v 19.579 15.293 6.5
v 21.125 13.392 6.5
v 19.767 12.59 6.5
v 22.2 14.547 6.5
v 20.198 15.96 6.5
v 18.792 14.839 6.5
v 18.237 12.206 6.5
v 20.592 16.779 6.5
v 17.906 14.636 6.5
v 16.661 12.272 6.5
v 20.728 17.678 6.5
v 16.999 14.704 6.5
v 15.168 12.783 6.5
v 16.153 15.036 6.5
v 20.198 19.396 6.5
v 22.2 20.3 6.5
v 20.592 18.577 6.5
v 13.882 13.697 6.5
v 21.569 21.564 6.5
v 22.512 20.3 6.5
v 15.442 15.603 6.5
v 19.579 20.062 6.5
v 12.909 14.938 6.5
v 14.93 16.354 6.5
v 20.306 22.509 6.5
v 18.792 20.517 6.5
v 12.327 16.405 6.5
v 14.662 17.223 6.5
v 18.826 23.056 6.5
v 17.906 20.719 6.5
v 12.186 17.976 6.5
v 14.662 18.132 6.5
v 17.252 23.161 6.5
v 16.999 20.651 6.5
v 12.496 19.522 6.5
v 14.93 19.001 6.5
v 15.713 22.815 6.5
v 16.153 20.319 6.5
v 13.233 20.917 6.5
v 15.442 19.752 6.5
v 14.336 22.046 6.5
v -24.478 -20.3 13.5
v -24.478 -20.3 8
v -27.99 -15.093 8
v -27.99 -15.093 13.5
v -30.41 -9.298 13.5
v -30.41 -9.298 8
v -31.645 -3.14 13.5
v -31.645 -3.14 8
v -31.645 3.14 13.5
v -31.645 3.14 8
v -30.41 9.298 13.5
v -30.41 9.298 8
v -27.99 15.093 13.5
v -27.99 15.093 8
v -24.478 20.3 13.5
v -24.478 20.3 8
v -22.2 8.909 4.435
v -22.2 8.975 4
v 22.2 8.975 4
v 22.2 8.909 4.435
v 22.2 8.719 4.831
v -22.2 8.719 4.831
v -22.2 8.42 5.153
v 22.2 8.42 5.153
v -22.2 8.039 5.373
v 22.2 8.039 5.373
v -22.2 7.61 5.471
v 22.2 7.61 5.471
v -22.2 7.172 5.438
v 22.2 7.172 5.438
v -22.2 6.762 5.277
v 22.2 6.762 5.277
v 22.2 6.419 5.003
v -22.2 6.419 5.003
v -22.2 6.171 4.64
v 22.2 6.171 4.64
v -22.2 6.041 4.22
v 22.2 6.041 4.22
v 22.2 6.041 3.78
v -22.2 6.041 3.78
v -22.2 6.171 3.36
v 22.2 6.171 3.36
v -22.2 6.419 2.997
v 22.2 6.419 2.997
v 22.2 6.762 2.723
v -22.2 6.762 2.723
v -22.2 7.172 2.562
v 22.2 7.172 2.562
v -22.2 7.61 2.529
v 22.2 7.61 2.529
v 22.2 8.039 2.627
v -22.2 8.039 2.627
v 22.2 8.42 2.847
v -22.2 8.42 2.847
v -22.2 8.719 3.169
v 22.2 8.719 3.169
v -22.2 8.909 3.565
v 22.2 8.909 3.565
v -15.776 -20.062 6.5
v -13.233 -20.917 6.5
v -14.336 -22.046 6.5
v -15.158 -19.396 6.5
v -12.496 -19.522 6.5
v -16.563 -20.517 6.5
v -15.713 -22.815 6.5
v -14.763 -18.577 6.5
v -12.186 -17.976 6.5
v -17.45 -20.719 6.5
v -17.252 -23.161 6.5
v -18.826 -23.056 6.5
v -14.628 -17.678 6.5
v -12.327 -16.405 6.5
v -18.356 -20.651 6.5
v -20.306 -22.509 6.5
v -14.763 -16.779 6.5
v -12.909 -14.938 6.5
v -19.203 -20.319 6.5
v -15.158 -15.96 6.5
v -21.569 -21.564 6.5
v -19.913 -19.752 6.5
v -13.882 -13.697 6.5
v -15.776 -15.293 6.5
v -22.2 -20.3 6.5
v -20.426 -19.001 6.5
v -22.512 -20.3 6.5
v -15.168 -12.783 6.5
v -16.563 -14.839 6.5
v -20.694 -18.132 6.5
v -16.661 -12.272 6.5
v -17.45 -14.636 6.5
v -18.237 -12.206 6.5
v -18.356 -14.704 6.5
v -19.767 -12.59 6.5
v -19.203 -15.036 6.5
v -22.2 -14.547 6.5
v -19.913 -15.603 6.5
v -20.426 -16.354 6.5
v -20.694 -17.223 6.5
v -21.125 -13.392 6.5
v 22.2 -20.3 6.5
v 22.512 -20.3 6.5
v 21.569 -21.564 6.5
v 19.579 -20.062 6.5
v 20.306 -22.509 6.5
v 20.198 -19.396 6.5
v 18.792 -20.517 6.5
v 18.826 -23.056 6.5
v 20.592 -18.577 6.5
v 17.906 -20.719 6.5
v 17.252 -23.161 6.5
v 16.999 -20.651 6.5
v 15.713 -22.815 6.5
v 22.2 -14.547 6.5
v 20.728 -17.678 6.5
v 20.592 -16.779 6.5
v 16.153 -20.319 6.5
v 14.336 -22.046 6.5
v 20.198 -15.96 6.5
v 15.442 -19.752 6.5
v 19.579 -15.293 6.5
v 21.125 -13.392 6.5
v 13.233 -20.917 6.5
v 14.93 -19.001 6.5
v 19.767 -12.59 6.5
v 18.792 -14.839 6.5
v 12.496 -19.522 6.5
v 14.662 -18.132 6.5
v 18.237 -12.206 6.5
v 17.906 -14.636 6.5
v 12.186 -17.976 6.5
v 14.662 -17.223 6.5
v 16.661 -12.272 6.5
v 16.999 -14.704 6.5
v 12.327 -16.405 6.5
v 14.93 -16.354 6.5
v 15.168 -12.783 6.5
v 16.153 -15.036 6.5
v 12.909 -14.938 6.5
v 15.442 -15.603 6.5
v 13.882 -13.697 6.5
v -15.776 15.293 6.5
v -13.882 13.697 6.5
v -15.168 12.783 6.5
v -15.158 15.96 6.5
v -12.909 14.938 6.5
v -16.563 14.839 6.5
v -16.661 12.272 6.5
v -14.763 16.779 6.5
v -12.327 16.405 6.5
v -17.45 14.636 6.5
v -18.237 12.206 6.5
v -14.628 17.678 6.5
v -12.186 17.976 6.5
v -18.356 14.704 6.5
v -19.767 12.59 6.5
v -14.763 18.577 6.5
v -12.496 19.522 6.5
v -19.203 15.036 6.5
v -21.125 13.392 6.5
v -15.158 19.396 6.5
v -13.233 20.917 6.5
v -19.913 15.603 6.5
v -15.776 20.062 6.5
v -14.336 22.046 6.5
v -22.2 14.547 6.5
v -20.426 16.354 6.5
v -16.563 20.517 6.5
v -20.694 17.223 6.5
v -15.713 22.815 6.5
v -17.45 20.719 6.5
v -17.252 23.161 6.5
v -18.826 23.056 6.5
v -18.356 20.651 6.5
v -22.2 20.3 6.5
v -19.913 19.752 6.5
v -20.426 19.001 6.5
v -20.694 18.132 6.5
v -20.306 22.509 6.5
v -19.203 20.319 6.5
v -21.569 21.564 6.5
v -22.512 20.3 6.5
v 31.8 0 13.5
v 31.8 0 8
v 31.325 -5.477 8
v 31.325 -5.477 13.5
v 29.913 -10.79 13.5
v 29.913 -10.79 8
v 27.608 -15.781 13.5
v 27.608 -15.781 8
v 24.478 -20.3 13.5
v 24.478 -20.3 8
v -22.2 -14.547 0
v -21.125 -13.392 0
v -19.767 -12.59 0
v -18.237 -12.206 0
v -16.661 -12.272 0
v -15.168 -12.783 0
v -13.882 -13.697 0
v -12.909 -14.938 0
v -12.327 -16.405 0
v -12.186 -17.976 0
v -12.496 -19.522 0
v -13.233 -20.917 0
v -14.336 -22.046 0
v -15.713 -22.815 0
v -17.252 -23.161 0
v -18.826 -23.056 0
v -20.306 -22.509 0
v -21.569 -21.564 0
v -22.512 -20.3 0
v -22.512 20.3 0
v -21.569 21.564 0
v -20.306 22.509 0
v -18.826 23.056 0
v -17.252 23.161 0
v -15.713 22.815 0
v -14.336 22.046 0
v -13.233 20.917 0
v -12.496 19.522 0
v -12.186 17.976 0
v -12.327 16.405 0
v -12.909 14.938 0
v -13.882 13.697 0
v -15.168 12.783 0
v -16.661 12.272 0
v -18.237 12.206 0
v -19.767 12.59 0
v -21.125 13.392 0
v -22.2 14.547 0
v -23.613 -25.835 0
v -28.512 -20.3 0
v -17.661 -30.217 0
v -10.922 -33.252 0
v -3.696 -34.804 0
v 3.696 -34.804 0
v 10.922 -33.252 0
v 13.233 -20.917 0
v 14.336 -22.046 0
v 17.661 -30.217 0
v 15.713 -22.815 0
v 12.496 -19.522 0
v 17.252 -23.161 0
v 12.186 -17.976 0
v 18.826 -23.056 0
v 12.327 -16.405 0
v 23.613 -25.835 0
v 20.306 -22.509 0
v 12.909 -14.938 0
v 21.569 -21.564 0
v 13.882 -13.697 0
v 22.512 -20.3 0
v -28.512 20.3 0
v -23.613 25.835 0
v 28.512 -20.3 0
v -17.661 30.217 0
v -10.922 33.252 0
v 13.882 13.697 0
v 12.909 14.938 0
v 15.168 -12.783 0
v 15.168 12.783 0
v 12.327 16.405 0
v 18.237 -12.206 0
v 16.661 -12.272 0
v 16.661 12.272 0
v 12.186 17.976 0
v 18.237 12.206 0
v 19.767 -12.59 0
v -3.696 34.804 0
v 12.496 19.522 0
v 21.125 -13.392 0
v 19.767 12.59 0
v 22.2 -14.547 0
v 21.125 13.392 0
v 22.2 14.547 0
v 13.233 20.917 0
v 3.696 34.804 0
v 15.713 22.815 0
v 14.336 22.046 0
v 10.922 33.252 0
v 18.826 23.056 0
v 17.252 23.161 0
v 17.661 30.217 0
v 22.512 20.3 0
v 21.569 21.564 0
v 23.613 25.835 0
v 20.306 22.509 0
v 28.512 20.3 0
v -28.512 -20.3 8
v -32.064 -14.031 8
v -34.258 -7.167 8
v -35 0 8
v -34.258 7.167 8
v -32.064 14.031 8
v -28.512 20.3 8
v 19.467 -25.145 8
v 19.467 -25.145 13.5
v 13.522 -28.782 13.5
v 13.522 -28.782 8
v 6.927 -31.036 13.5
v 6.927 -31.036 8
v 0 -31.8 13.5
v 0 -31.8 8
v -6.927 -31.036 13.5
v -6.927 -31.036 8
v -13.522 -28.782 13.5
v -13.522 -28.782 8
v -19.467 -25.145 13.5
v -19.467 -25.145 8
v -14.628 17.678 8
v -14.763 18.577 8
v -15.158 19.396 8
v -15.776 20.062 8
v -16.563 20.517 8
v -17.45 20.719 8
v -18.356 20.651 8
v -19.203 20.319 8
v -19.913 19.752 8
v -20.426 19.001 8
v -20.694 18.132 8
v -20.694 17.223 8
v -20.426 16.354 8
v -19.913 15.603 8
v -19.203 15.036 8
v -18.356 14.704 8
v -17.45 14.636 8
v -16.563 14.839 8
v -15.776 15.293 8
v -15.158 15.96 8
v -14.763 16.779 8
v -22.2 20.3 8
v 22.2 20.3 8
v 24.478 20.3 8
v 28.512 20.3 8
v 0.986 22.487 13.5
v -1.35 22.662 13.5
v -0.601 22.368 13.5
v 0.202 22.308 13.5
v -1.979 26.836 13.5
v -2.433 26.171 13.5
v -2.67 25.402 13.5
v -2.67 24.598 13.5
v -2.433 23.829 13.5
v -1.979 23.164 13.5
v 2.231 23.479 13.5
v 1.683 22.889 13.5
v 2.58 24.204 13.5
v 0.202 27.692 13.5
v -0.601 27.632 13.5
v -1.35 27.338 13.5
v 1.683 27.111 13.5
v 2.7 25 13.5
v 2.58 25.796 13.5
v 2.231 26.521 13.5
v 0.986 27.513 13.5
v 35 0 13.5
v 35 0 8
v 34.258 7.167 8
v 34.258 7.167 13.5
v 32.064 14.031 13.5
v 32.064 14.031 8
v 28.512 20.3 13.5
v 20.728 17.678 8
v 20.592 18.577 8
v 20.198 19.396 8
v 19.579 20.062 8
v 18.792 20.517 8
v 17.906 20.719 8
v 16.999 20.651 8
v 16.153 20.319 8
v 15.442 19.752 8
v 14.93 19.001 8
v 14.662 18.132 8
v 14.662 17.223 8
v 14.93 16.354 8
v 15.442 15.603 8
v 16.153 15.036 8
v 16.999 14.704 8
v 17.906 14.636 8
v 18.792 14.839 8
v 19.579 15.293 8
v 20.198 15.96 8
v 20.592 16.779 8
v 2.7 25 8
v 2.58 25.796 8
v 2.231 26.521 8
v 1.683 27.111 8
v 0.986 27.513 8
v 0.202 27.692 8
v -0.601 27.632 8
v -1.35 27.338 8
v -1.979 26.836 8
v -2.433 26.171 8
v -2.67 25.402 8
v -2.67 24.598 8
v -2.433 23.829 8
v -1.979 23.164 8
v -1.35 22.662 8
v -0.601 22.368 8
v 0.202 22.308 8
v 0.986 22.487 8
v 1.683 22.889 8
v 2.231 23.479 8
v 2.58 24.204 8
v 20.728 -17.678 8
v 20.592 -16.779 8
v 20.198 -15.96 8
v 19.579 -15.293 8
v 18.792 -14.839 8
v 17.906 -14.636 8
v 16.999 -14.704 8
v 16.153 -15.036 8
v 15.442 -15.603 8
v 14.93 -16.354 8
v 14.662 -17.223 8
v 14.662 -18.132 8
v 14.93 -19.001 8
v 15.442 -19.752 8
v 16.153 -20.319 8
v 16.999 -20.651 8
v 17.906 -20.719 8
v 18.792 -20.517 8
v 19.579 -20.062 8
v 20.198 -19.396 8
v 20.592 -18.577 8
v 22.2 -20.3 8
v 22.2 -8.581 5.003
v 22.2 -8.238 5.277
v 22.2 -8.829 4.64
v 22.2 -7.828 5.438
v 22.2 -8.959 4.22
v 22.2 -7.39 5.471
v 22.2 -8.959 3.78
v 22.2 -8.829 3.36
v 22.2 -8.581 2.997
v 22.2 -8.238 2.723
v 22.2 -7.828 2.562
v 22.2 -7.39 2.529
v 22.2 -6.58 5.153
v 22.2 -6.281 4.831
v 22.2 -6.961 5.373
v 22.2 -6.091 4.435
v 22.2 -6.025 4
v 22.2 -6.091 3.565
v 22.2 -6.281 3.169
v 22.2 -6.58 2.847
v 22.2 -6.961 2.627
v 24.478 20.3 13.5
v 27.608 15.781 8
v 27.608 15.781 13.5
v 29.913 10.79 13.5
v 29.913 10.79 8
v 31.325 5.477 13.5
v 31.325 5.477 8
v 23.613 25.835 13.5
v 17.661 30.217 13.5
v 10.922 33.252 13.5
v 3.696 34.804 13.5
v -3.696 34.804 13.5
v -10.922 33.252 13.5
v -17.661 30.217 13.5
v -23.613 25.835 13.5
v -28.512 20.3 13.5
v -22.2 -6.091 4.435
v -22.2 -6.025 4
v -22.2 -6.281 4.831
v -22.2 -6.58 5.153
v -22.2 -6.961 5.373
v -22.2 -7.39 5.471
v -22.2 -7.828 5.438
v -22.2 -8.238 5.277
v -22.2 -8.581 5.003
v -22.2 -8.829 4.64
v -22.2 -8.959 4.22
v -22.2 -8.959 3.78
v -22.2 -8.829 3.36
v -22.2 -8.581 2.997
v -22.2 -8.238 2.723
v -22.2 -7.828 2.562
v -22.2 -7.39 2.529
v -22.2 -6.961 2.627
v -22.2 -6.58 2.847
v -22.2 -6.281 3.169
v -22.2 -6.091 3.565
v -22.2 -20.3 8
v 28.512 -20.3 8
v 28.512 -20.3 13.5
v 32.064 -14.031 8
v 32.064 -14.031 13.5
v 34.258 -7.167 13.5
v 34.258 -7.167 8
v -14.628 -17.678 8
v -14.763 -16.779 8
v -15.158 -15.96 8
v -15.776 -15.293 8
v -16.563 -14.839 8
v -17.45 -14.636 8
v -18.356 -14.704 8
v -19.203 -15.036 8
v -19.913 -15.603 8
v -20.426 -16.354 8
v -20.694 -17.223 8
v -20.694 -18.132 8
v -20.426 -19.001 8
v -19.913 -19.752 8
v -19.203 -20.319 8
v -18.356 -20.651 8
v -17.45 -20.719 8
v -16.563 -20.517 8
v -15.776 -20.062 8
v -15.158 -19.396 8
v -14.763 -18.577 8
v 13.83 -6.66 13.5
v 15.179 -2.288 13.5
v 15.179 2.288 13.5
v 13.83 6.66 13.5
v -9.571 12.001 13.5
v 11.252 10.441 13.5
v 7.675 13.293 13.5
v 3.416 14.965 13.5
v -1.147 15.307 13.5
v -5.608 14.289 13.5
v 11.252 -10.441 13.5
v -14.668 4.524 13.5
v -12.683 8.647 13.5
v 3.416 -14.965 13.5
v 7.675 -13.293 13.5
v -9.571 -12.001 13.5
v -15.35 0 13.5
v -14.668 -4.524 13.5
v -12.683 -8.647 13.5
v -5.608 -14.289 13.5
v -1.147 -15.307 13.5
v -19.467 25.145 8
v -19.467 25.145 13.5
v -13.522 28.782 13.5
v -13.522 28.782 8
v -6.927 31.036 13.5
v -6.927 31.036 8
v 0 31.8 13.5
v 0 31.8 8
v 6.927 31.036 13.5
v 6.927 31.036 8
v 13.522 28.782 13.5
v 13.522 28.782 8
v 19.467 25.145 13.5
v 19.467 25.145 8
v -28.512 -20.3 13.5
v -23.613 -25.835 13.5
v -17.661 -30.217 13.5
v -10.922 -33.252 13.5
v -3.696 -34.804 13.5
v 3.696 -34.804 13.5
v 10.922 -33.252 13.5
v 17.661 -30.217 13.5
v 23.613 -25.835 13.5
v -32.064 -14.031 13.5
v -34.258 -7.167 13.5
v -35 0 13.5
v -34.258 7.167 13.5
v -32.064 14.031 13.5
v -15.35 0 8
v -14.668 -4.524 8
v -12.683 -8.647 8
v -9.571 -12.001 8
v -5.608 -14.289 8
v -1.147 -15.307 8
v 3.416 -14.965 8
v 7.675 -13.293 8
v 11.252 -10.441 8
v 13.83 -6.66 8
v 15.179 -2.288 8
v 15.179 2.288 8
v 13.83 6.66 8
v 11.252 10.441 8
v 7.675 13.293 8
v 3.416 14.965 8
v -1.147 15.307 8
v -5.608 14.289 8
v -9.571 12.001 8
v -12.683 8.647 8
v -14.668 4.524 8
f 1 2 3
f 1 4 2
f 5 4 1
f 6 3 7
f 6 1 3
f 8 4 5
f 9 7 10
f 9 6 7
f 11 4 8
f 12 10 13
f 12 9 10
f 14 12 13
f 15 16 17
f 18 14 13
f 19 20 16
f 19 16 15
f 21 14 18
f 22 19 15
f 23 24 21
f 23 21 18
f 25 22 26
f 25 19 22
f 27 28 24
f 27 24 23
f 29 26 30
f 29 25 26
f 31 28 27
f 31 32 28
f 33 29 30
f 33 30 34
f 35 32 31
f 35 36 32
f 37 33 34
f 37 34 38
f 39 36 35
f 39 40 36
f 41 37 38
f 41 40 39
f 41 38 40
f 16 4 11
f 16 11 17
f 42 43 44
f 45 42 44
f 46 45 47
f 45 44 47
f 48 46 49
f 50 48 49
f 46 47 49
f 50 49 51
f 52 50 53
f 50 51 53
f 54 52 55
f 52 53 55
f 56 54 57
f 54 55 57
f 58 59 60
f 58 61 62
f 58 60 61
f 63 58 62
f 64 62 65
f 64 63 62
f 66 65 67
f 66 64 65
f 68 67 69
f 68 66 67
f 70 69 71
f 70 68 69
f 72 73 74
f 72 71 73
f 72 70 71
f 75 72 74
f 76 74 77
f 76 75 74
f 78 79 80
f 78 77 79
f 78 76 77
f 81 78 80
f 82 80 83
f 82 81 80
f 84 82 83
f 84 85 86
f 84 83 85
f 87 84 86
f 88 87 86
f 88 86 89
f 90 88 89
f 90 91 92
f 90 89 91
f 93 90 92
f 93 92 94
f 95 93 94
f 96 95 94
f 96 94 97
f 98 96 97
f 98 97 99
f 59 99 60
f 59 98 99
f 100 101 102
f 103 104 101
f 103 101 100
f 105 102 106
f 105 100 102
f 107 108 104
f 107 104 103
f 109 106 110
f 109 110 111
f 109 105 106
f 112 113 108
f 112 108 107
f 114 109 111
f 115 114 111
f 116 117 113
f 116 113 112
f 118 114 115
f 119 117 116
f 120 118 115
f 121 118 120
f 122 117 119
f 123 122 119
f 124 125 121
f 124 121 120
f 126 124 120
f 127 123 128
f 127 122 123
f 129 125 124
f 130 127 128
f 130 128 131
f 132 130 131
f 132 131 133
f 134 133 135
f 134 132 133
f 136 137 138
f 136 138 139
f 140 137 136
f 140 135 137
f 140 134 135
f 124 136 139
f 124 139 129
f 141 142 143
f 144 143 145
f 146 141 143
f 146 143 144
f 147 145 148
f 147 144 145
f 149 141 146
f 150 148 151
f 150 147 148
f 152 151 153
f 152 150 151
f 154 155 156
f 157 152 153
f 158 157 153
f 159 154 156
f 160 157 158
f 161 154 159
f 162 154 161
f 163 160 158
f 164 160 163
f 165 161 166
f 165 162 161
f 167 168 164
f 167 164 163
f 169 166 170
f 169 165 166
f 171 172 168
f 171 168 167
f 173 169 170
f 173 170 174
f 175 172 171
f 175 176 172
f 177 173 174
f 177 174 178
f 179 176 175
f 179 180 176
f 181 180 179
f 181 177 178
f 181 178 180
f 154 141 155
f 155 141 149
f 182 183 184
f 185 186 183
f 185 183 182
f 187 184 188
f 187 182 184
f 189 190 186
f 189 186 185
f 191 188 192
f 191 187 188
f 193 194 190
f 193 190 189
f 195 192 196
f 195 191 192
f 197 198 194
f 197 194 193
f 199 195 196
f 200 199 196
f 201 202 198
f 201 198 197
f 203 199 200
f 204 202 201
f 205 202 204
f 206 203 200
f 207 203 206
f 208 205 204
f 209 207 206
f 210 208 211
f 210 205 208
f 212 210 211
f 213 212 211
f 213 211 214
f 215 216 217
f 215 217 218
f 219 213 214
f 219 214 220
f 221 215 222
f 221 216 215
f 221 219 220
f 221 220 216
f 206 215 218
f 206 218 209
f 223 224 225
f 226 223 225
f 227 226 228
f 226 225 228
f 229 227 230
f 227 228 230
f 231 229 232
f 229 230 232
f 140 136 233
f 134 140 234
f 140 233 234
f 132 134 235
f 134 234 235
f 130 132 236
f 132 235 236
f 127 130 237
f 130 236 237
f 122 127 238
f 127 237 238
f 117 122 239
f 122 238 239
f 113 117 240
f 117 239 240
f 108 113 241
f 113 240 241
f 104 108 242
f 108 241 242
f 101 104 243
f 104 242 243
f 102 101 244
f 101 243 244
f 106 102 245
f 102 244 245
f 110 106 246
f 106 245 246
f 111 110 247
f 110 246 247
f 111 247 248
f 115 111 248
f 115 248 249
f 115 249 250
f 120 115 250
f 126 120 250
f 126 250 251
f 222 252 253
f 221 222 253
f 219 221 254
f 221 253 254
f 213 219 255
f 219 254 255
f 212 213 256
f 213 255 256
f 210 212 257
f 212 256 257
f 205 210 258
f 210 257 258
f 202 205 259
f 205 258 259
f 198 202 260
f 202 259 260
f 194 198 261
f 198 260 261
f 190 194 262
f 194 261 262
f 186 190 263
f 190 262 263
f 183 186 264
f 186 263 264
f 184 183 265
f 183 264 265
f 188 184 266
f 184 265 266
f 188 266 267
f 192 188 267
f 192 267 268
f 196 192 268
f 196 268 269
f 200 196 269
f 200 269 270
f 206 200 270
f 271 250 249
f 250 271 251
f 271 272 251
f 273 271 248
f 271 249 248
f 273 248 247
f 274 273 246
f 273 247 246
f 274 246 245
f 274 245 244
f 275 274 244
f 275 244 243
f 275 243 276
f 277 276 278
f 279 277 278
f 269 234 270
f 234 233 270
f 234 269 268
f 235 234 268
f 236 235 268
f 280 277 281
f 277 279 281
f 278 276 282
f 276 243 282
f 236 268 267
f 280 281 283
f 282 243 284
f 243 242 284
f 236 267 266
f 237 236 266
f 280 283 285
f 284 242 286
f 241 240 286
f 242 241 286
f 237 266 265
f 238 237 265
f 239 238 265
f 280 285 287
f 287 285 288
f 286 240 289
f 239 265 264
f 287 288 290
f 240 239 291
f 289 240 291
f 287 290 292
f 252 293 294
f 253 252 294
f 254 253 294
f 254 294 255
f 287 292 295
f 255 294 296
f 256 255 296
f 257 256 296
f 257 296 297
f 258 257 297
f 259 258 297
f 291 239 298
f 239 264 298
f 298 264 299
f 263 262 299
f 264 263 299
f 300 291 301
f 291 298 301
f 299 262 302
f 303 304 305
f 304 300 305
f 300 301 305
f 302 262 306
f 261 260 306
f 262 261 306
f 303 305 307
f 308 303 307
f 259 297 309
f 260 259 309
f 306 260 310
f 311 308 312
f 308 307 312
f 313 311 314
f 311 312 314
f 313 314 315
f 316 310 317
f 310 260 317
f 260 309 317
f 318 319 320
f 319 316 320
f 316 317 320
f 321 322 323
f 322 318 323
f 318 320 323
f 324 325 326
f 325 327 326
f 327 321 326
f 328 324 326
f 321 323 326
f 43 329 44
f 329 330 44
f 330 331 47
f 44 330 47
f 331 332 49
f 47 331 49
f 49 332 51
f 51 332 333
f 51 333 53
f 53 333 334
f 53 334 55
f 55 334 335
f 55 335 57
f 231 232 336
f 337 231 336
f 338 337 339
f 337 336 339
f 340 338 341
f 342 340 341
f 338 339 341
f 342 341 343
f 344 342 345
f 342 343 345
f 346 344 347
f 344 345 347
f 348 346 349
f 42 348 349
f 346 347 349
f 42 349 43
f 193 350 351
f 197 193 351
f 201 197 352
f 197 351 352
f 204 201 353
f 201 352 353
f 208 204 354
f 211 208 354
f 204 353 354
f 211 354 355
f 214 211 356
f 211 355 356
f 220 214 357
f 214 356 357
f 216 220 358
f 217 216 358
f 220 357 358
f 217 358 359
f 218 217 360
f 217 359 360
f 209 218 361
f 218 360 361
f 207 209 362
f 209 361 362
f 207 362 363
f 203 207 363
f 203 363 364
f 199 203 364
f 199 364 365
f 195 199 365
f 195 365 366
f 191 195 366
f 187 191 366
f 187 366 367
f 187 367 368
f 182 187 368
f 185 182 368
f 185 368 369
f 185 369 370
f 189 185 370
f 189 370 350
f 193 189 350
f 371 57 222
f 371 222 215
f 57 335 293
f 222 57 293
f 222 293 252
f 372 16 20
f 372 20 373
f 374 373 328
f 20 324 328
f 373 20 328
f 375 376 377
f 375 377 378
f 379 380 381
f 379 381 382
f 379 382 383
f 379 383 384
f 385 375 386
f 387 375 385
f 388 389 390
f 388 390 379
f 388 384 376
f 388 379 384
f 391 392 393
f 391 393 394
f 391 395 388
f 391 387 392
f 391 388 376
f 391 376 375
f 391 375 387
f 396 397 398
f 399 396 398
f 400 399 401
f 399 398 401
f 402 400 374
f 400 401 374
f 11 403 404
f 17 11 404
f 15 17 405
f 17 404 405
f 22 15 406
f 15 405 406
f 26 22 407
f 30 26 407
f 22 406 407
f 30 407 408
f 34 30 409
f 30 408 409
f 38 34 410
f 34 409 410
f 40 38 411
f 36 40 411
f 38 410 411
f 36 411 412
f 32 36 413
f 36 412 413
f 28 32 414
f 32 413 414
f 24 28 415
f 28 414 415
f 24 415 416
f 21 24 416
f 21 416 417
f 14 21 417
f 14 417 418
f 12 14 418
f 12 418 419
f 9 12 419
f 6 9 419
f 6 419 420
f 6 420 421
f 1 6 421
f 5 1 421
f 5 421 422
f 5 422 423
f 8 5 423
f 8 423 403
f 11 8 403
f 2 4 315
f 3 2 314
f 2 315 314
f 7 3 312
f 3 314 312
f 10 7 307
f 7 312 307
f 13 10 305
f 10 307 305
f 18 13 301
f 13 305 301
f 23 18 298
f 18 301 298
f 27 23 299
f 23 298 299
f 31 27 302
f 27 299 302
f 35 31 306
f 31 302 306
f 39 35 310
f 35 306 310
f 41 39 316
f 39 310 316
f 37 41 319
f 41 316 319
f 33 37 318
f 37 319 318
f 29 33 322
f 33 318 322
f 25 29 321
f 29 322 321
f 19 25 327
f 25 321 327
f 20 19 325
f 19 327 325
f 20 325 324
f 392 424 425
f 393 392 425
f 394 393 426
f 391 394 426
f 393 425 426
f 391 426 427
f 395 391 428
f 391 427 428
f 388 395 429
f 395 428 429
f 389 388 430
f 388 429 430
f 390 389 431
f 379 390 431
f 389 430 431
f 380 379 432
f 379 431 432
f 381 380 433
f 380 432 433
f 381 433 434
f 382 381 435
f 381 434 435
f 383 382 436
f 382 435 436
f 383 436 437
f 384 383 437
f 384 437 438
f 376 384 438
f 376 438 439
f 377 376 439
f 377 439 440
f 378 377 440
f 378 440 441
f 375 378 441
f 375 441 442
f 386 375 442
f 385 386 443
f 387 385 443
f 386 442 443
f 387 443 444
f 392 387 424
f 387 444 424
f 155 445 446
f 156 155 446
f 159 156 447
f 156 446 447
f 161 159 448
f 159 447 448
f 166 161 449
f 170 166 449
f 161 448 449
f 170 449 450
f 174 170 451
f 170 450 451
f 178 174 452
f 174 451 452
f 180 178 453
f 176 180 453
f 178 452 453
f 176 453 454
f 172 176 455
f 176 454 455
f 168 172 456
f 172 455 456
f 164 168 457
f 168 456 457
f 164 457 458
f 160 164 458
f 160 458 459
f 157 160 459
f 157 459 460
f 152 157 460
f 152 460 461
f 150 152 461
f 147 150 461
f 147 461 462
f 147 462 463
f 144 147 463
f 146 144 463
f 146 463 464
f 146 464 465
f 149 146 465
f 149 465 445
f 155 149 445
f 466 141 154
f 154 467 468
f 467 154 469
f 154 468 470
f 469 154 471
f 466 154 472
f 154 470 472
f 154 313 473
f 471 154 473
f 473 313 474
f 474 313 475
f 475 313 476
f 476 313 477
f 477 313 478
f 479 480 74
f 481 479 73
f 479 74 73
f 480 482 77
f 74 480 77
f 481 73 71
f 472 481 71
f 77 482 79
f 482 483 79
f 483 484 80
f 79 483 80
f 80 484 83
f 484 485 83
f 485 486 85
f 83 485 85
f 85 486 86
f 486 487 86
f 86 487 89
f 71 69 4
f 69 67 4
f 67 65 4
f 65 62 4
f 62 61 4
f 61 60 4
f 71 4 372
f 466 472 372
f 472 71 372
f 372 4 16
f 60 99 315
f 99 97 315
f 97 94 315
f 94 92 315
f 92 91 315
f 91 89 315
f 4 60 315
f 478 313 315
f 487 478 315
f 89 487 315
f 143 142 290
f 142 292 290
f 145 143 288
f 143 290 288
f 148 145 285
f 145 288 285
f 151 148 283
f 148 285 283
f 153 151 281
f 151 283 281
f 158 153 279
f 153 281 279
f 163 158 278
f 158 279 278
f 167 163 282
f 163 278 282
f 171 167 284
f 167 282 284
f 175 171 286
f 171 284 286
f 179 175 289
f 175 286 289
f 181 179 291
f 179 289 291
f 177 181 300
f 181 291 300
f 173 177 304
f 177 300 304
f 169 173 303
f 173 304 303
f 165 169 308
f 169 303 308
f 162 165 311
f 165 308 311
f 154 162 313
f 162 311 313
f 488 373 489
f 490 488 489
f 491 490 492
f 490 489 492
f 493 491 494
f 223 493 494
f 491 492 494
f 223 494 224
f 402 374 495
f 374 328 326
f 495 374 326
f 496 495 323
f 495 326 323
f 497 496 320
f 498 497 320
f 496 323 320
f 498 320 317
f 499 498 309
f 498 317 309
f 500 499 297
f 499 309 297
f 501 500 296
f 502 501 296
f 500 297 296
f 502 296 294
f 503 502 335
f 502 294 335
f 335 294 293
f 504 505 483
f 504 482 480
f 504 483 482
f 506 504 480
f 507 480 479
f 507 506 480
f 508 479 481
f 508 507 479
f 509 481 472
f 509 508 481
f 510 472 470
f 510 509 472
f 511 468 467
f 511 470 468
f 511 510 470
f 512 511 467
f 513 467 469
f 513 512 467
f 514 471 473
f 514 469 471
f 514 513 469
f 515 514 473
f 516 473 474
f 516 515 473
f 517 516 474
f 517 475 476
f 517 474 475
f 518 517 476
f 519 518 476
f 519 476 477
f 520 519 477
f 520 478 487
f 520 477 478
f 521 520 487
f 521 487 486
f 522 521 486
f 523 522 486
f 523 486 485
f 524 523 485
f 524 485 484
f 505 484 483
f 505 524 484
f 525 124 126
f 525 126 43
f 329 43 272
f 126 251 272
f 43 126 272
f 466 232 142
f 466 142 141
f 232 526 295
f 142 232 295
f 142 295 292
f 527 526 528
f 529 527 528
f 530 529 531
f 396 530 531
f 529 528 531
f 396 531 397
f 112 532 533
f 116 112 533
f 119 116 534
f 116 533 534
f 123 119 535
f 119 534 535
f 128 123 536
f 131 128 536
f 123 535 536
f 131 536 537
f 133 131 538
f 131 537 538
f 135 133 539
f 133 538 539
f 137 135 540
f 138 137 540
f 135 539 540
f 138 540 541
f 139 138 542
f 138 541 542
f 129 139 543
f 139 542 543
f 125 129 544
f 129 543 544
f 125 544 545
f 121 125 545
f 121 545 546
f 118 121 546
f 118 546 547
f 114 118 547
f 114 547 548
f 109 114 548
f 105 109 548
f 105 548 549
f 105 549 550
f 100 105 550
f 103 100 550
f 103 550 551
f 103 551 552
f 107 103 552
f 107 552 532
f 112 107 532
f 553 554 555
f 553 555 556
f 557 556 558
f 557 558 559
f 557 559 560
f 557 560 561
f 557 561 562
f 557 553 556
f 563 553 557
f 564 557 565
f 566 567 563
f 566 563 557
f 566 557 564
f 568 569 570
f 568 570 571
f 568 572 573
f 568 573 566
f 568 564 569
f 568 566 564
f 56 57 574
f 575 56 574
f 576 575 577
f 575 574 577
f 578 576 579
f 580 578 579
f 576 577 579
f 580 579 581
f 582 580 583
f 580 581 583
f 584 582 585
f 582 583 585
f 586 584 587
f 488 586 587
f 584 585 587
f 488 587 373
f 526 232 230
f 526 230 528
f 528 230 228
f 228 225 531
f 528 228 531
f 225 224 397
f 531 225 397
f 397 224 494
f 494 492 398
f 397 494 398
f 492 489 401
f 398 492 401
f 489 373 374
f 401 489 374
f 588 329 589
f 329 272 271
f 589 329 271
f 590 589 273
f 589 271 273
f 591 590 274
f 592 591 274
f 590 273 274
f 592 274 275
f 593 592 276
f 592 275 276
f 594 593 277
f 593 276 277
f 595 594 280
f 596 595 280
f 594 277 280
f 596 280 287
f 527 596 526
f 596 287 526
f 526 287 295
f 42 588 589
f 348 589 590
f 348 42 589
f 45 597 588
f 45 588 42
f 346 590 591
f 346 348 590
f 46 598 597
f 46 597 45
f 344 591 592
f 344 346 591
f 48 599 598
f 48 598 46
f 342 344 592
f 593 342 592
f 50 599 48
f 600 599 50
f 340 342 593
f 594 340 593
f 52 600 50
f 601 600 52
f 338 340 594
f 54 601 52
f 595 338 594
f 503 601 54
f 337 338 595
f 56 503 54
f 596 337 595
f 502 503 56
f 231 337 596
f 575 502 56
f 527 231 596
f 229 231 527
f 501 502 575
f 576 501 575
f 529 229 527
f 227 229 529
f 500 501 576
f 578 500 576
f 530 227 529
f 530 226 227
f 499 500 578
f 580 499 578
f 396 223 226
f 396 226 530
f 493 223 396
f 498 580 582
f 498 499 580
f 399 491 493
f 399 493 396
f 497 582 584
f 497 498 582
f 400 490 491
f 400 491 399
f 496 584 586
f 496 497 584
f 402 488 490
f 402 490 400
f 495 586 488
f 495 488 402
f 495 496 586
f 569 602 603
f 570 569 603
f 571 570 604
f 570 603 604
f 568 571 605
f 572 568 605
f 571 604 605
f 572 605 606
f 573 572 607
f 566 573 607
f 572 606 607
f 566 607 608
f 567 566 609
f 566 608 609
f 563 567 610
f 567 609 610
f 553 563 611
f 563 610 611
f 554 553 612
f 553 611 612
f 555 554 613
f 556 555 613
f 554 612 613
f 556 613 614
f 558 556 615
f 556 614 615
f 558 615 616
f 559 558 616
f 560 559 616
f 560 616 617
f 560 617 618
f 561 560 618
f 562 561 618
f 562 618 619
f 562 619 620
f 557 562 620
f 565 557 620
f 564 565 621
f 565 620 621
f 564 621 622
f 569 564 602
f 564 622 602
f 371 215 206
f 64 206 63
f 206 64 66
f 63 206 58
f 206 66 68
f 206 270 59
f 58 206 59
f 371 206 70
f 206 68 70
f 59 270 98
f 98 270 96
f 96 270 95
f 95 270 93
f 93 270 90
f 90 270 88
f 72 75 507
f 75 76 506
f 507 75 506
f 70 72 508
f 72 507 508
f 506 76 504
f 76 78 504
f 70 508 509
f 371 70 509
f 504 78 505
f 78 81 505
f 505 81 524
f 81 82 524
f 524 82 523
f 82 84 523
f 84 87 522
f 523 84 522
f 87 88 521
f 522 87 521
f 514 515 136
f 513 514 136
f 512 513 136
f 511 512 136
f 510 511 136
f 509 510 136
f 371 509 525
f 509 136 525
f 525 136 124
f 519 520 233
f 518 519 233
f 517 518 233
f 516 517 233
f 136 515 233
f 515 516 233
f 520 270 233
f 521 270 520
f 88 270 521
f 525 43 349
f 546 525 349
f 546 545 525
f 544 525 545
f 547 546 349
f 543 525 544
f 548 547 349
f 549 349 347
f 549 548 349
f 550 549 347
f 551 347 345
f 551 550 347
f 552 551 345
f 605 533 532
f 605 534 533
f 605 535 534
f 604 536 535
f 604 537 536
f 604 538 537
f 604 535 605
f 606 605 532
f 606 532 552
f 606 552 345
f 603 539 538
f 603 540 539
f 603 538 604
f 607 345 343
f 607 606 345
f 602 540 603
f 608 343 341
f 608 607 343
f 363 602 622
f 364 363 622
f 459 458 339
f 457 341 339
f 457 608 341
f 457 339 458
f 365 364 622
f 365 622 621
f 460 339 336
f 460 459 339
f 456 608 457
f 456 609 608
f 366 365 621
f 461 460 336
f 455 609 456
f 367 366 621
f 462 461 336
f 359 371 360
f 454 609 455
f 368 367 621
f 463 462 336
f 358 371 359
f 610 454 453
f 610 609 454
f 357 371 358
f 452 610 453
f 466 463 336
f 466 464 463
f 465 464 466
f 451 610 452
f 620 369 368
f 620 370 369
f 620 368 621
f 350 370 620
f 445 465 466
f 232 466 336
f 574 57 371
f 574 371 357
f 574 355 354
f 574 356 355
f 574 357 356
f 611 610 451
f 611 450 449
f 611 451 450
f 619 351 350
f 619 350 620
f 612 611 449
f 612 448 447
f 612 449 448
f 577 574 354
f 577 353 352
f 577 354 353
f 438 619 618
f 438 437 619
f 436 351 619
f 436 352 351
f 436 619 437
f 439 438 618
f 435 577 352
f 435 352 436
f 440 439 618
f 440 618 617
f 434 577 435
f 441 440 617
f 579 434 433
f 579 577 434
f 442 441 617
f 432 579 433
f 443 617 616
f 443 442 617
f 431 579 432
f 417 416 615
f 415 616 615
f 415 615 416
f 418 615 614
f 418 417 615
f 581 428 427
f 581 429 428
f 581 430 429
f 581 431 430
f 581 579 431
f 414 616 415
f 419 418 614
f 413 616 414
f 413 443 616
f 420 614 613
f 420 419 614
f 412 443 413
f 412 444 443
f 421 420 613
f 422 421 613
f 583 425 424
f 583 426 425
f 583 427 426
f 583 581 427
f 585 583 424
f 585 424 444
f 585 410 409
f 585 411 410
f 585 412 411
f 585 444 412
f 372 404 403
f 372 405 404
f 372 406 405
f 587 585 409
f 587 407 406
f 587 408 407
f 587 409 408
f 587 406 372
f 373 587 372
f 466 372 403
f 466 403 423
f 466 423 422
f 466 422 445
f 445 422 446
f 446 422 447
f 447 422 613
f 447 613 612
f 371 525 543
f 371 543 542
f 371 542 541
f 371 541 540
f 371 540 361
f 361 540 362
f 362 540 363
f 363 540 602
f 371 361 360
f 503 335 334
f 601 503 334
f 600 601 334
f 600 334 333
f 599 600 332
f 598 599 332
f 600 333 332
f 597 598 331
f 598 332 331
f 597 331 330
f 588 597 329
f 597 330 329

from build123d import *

# Parameters (mm, degrees)
BOSS_EXTRUDE1_DEPTH     = 8
CUT_EXTRUDE1_REACH      = 47.847
SKETCH2_R               = 3.05
SKETCH5_R               = 2.7
BOSS_EXTRUDE2_DEPTH     = 5.5
SKETCH6_R               = 15.35
BOSS_EXTRUDE3_DEPTH     = 5.5
SKETCH7_R               = 5.5
CUT_EXTRUDE2_DEPTH      = 6.5
CUT_EXTRUDE3_DEPTH      = 52.305457799
CUT_EXTRUDE3_DEPTH_BACK = 52.305457799
SKETCH8_R               = 1.475


with BuildPart() as part:
    # Sketch1 → Boss-Extrude1 (new body)
    with BuildSketch(Plane.XY):
        with BuildLine():
            Line((28.511576596, -20.3), (22.2, -20.3))
            Line((22.2, -20.3), (22.2, 20.3))
            Line((22.2, 20.3), (28.511576596, 20.3))
            ThreePointArc((28.511576596, 20.3), (0, 35), (-28.511576596, 20.3))
            Line((-28.511576596, 20.3), (-22.2, 20.3))
            Line((-22.2, 20.3), (-22.2, -20.3))
            Line((-22.2, -20.3), (-28.511576596, -20.3))
            ThreePointArc((-28.511576596, -20.3), (0, -35), (28.511576596, -20.3))
        make_face()
    extrude(amount=BOSS_EXTRUDE1_DEPTH)

    # Sketch2 → Cut-Extrude1 (cut, up to next)
    with BuildSketch(Plane.XY.offset(8), mode=Mode.PRIVATE) as cut_extrude1_sk1:
        with Locations((17.67766953, -17.67766953)):
            Circle(SKETCH2_R)
    cut_extrude1_tool1 = extrude(cut_extrude1_sk1.sketch, amount=-CUT_EXTRUDE1_REACH, mode=Mode.PRIVATE) & part.part
    # Sketch2 → Cut-Extrude1 (cut, up to next)
    with BuildSketch(Plane.XY.offset(8), mode=Mode.PRIVATE) as cut_extrude1_sk2:
        with Locations((17.67766953, 17.67766953)):
            Circle(SKETCH2_R)
    cut_extrude1_tool2 = extrude(cut_extrude1_sk2.sketch, amount=-CUT_EXTRUDE1_REACH, mode=Mode.PRIVATE) & part.part
    # Sketch2 → Cut-Extrude1 (cut, up to next)
    with BuildSketch(Plane.XY.offset(8), mode=Mode.PRIVATE) as cut_extrude1_sk3:
        with Locations((-17.67766953, 17.67766953)):
            Circle(SKETCH2_R)
    cut_extrude1_tool3 = extrude(cut_extrude1_sk3.sketch, amount=-CUT_EXTRUDE1_REACH, mode=Mode.PRIVATE) & part.part
    # Sketch2 → Cut-Extrude1 (cut, up to next)
    with BuildSketch(Plane.XY.offset(8), mode=Mode.PRIVATE) as cut_extrude1_sk4:
        with Locations((-17.67766953, -17.67766953)):
            Circle(SKETCH2_R)
    cut_extrude1_tool4 = extrude(cut_extrude1_sk4.sketch, amount=-CUT_EXTRUDE1_REACH, mode=Mode.PRIVATE) & part.part
    add(cut_extrude1_tool1.solids().sort_by_distance((17.67767, -17.67767, 8))[0], mode=Mode.SUBTRACT)
    add(cut_extrude1_tool2.solids().sort_by_distance((17.67767, 17.67767, 8))[0], mode=Mode.SUBTRACT)
    add(cut_extrude1_tool3.solids().sort_by_distance((-17.67767, 17.67767, 8))[0], mode=Mode.SUBTRACT)
    add(cut_extrude1_tool4.solids().sort_by_distance((-17.67767, -17.67767, 8))[0], mode=Mode.SUBTRACT)

    # Sketch5 → Boss-Extrude2 (add)
    with BuildSketch(Plane.XY.offset(8)):
        with BuildLine():
            ThreePointArc((-24.477540726, -20.3), (-31.8, 0), (-24.477540726, 20.3))
            Line((-24.477540726, 20.3), (-28.511576596, 20.3))
            ThreePointArc((-28.511576596, 20.3), (-35, 0), (-28.511576596, -20.3))
            Line((-28.511576596, -20.3), (-24.477540726, -20.3))
        make_face()
        with BuildLine():
            ThreePointArc((-24.477540726, 20.3), (0, 31.8), (24.477540726, 20.3))
            Line((24.477540726, 20.3), (28.511576596, 20.3))
            ThreePointArc((28.511576596, 20.3), (0, 35), (-28.511576596, 20.3))
            Line((-28.511576596, 20.3), (-24.477540726, 20.3))
        make_face()
        with BuildLine():
            ThreePointArc((24.477540726, 20.3), (29.913423367, 10.79013913), (31.8, 0))
            ThreePointArc((31.8, 0), (29.913423367, -10.79013913), (24.477540726, -20.3))
            Line((24.477540726, -20.3), (28.511576596, -20.3))
            ThreePointArc((28.511576596, -20.3), (33.33845513, -10.655862685), (35, 0))
            ThreePointArc((35, 0), (33.33845513, 10.655862685), (28.511576596, 20.3))
            Line((28.511576596, 20.3), (24.477540726, 20.3))
        make_face()
        with BuildLine():
            Line((28.511576596, -20.3), (24.477540726, -20.3))
            ThreePointArc((24.477540726, -20.3), (0, -31.8), (-24.477540726, -20.3))
            Line((-24.477540726, -20.3), (-28.511576596, -20.3))
            ThreePointArc((-28.511576596, -20.3), (0, -35), (28.511576596, -20.3))
        make_face()
        with Locations((0, 25)):
            Circle(SKETCH5_R)
    extrude(amount=BOSS_EXTRUDE2_DEPTH)

    # Sketch6 → Boss-Extrude3 (add)
    with BuildSketch(Plane.XY.offset(8)):
        with Locations(Location((0, 0, 0), (0, 0, 180))):
            Circle(SKETCH6_R)
    extrude(amount=BOSS_EXTRUDE3_DEPTH)

    # Sketch7 → Cut-Extrude2 (cut)
    with BuildSketch(Plane(origin=(0, 0, 0), x_dir=(-1, 0, 0), z_dir=(0, 0, -1))):
        with Locations((-17.67766953, 17.67766953)):
            Circle(SKETCH7_R)
        with Locations((17.67766953, 17.67766953)):
            Circle(SKETCH7_R)
        with Locations((17.67766953, -17.67766953)):
            Circle(SKETCH7_R)
        with Locations((-17.67766953, -17.67766953)):
            Circle(SKETCH7_R)
    extrude(amount=-CUT_EXTRUDE2_DEPTH, mode=Mode.SUBTRACT)

    # Sketch8 → Cut-Extrude3 (cut, two sides: drawn at the far end of the back side and taken through both)
    with BuildSketch(Plane(origin=(0, 0, 0), x_dir=(0, 0, -1), z_dir=(1, 0, 0)).offset(-CUT_EXTRUDE3_DEPTH_BACK)):
        with Locations(Location((-4, 7.5, 0), (0, 0, 90))):
            Circle(SKETCH8_R)
        with Locations(Location((-4, -7.5, 0), (0, 0, 90))):
            Circle(SKETCH8_R)
    extrude(amount=CUT_EXTRUDE3_DEPTH + CUT_EXTRUDE3_DEPTH_BACK, mode=Mode.SUBTRACT)


solid = part.part
